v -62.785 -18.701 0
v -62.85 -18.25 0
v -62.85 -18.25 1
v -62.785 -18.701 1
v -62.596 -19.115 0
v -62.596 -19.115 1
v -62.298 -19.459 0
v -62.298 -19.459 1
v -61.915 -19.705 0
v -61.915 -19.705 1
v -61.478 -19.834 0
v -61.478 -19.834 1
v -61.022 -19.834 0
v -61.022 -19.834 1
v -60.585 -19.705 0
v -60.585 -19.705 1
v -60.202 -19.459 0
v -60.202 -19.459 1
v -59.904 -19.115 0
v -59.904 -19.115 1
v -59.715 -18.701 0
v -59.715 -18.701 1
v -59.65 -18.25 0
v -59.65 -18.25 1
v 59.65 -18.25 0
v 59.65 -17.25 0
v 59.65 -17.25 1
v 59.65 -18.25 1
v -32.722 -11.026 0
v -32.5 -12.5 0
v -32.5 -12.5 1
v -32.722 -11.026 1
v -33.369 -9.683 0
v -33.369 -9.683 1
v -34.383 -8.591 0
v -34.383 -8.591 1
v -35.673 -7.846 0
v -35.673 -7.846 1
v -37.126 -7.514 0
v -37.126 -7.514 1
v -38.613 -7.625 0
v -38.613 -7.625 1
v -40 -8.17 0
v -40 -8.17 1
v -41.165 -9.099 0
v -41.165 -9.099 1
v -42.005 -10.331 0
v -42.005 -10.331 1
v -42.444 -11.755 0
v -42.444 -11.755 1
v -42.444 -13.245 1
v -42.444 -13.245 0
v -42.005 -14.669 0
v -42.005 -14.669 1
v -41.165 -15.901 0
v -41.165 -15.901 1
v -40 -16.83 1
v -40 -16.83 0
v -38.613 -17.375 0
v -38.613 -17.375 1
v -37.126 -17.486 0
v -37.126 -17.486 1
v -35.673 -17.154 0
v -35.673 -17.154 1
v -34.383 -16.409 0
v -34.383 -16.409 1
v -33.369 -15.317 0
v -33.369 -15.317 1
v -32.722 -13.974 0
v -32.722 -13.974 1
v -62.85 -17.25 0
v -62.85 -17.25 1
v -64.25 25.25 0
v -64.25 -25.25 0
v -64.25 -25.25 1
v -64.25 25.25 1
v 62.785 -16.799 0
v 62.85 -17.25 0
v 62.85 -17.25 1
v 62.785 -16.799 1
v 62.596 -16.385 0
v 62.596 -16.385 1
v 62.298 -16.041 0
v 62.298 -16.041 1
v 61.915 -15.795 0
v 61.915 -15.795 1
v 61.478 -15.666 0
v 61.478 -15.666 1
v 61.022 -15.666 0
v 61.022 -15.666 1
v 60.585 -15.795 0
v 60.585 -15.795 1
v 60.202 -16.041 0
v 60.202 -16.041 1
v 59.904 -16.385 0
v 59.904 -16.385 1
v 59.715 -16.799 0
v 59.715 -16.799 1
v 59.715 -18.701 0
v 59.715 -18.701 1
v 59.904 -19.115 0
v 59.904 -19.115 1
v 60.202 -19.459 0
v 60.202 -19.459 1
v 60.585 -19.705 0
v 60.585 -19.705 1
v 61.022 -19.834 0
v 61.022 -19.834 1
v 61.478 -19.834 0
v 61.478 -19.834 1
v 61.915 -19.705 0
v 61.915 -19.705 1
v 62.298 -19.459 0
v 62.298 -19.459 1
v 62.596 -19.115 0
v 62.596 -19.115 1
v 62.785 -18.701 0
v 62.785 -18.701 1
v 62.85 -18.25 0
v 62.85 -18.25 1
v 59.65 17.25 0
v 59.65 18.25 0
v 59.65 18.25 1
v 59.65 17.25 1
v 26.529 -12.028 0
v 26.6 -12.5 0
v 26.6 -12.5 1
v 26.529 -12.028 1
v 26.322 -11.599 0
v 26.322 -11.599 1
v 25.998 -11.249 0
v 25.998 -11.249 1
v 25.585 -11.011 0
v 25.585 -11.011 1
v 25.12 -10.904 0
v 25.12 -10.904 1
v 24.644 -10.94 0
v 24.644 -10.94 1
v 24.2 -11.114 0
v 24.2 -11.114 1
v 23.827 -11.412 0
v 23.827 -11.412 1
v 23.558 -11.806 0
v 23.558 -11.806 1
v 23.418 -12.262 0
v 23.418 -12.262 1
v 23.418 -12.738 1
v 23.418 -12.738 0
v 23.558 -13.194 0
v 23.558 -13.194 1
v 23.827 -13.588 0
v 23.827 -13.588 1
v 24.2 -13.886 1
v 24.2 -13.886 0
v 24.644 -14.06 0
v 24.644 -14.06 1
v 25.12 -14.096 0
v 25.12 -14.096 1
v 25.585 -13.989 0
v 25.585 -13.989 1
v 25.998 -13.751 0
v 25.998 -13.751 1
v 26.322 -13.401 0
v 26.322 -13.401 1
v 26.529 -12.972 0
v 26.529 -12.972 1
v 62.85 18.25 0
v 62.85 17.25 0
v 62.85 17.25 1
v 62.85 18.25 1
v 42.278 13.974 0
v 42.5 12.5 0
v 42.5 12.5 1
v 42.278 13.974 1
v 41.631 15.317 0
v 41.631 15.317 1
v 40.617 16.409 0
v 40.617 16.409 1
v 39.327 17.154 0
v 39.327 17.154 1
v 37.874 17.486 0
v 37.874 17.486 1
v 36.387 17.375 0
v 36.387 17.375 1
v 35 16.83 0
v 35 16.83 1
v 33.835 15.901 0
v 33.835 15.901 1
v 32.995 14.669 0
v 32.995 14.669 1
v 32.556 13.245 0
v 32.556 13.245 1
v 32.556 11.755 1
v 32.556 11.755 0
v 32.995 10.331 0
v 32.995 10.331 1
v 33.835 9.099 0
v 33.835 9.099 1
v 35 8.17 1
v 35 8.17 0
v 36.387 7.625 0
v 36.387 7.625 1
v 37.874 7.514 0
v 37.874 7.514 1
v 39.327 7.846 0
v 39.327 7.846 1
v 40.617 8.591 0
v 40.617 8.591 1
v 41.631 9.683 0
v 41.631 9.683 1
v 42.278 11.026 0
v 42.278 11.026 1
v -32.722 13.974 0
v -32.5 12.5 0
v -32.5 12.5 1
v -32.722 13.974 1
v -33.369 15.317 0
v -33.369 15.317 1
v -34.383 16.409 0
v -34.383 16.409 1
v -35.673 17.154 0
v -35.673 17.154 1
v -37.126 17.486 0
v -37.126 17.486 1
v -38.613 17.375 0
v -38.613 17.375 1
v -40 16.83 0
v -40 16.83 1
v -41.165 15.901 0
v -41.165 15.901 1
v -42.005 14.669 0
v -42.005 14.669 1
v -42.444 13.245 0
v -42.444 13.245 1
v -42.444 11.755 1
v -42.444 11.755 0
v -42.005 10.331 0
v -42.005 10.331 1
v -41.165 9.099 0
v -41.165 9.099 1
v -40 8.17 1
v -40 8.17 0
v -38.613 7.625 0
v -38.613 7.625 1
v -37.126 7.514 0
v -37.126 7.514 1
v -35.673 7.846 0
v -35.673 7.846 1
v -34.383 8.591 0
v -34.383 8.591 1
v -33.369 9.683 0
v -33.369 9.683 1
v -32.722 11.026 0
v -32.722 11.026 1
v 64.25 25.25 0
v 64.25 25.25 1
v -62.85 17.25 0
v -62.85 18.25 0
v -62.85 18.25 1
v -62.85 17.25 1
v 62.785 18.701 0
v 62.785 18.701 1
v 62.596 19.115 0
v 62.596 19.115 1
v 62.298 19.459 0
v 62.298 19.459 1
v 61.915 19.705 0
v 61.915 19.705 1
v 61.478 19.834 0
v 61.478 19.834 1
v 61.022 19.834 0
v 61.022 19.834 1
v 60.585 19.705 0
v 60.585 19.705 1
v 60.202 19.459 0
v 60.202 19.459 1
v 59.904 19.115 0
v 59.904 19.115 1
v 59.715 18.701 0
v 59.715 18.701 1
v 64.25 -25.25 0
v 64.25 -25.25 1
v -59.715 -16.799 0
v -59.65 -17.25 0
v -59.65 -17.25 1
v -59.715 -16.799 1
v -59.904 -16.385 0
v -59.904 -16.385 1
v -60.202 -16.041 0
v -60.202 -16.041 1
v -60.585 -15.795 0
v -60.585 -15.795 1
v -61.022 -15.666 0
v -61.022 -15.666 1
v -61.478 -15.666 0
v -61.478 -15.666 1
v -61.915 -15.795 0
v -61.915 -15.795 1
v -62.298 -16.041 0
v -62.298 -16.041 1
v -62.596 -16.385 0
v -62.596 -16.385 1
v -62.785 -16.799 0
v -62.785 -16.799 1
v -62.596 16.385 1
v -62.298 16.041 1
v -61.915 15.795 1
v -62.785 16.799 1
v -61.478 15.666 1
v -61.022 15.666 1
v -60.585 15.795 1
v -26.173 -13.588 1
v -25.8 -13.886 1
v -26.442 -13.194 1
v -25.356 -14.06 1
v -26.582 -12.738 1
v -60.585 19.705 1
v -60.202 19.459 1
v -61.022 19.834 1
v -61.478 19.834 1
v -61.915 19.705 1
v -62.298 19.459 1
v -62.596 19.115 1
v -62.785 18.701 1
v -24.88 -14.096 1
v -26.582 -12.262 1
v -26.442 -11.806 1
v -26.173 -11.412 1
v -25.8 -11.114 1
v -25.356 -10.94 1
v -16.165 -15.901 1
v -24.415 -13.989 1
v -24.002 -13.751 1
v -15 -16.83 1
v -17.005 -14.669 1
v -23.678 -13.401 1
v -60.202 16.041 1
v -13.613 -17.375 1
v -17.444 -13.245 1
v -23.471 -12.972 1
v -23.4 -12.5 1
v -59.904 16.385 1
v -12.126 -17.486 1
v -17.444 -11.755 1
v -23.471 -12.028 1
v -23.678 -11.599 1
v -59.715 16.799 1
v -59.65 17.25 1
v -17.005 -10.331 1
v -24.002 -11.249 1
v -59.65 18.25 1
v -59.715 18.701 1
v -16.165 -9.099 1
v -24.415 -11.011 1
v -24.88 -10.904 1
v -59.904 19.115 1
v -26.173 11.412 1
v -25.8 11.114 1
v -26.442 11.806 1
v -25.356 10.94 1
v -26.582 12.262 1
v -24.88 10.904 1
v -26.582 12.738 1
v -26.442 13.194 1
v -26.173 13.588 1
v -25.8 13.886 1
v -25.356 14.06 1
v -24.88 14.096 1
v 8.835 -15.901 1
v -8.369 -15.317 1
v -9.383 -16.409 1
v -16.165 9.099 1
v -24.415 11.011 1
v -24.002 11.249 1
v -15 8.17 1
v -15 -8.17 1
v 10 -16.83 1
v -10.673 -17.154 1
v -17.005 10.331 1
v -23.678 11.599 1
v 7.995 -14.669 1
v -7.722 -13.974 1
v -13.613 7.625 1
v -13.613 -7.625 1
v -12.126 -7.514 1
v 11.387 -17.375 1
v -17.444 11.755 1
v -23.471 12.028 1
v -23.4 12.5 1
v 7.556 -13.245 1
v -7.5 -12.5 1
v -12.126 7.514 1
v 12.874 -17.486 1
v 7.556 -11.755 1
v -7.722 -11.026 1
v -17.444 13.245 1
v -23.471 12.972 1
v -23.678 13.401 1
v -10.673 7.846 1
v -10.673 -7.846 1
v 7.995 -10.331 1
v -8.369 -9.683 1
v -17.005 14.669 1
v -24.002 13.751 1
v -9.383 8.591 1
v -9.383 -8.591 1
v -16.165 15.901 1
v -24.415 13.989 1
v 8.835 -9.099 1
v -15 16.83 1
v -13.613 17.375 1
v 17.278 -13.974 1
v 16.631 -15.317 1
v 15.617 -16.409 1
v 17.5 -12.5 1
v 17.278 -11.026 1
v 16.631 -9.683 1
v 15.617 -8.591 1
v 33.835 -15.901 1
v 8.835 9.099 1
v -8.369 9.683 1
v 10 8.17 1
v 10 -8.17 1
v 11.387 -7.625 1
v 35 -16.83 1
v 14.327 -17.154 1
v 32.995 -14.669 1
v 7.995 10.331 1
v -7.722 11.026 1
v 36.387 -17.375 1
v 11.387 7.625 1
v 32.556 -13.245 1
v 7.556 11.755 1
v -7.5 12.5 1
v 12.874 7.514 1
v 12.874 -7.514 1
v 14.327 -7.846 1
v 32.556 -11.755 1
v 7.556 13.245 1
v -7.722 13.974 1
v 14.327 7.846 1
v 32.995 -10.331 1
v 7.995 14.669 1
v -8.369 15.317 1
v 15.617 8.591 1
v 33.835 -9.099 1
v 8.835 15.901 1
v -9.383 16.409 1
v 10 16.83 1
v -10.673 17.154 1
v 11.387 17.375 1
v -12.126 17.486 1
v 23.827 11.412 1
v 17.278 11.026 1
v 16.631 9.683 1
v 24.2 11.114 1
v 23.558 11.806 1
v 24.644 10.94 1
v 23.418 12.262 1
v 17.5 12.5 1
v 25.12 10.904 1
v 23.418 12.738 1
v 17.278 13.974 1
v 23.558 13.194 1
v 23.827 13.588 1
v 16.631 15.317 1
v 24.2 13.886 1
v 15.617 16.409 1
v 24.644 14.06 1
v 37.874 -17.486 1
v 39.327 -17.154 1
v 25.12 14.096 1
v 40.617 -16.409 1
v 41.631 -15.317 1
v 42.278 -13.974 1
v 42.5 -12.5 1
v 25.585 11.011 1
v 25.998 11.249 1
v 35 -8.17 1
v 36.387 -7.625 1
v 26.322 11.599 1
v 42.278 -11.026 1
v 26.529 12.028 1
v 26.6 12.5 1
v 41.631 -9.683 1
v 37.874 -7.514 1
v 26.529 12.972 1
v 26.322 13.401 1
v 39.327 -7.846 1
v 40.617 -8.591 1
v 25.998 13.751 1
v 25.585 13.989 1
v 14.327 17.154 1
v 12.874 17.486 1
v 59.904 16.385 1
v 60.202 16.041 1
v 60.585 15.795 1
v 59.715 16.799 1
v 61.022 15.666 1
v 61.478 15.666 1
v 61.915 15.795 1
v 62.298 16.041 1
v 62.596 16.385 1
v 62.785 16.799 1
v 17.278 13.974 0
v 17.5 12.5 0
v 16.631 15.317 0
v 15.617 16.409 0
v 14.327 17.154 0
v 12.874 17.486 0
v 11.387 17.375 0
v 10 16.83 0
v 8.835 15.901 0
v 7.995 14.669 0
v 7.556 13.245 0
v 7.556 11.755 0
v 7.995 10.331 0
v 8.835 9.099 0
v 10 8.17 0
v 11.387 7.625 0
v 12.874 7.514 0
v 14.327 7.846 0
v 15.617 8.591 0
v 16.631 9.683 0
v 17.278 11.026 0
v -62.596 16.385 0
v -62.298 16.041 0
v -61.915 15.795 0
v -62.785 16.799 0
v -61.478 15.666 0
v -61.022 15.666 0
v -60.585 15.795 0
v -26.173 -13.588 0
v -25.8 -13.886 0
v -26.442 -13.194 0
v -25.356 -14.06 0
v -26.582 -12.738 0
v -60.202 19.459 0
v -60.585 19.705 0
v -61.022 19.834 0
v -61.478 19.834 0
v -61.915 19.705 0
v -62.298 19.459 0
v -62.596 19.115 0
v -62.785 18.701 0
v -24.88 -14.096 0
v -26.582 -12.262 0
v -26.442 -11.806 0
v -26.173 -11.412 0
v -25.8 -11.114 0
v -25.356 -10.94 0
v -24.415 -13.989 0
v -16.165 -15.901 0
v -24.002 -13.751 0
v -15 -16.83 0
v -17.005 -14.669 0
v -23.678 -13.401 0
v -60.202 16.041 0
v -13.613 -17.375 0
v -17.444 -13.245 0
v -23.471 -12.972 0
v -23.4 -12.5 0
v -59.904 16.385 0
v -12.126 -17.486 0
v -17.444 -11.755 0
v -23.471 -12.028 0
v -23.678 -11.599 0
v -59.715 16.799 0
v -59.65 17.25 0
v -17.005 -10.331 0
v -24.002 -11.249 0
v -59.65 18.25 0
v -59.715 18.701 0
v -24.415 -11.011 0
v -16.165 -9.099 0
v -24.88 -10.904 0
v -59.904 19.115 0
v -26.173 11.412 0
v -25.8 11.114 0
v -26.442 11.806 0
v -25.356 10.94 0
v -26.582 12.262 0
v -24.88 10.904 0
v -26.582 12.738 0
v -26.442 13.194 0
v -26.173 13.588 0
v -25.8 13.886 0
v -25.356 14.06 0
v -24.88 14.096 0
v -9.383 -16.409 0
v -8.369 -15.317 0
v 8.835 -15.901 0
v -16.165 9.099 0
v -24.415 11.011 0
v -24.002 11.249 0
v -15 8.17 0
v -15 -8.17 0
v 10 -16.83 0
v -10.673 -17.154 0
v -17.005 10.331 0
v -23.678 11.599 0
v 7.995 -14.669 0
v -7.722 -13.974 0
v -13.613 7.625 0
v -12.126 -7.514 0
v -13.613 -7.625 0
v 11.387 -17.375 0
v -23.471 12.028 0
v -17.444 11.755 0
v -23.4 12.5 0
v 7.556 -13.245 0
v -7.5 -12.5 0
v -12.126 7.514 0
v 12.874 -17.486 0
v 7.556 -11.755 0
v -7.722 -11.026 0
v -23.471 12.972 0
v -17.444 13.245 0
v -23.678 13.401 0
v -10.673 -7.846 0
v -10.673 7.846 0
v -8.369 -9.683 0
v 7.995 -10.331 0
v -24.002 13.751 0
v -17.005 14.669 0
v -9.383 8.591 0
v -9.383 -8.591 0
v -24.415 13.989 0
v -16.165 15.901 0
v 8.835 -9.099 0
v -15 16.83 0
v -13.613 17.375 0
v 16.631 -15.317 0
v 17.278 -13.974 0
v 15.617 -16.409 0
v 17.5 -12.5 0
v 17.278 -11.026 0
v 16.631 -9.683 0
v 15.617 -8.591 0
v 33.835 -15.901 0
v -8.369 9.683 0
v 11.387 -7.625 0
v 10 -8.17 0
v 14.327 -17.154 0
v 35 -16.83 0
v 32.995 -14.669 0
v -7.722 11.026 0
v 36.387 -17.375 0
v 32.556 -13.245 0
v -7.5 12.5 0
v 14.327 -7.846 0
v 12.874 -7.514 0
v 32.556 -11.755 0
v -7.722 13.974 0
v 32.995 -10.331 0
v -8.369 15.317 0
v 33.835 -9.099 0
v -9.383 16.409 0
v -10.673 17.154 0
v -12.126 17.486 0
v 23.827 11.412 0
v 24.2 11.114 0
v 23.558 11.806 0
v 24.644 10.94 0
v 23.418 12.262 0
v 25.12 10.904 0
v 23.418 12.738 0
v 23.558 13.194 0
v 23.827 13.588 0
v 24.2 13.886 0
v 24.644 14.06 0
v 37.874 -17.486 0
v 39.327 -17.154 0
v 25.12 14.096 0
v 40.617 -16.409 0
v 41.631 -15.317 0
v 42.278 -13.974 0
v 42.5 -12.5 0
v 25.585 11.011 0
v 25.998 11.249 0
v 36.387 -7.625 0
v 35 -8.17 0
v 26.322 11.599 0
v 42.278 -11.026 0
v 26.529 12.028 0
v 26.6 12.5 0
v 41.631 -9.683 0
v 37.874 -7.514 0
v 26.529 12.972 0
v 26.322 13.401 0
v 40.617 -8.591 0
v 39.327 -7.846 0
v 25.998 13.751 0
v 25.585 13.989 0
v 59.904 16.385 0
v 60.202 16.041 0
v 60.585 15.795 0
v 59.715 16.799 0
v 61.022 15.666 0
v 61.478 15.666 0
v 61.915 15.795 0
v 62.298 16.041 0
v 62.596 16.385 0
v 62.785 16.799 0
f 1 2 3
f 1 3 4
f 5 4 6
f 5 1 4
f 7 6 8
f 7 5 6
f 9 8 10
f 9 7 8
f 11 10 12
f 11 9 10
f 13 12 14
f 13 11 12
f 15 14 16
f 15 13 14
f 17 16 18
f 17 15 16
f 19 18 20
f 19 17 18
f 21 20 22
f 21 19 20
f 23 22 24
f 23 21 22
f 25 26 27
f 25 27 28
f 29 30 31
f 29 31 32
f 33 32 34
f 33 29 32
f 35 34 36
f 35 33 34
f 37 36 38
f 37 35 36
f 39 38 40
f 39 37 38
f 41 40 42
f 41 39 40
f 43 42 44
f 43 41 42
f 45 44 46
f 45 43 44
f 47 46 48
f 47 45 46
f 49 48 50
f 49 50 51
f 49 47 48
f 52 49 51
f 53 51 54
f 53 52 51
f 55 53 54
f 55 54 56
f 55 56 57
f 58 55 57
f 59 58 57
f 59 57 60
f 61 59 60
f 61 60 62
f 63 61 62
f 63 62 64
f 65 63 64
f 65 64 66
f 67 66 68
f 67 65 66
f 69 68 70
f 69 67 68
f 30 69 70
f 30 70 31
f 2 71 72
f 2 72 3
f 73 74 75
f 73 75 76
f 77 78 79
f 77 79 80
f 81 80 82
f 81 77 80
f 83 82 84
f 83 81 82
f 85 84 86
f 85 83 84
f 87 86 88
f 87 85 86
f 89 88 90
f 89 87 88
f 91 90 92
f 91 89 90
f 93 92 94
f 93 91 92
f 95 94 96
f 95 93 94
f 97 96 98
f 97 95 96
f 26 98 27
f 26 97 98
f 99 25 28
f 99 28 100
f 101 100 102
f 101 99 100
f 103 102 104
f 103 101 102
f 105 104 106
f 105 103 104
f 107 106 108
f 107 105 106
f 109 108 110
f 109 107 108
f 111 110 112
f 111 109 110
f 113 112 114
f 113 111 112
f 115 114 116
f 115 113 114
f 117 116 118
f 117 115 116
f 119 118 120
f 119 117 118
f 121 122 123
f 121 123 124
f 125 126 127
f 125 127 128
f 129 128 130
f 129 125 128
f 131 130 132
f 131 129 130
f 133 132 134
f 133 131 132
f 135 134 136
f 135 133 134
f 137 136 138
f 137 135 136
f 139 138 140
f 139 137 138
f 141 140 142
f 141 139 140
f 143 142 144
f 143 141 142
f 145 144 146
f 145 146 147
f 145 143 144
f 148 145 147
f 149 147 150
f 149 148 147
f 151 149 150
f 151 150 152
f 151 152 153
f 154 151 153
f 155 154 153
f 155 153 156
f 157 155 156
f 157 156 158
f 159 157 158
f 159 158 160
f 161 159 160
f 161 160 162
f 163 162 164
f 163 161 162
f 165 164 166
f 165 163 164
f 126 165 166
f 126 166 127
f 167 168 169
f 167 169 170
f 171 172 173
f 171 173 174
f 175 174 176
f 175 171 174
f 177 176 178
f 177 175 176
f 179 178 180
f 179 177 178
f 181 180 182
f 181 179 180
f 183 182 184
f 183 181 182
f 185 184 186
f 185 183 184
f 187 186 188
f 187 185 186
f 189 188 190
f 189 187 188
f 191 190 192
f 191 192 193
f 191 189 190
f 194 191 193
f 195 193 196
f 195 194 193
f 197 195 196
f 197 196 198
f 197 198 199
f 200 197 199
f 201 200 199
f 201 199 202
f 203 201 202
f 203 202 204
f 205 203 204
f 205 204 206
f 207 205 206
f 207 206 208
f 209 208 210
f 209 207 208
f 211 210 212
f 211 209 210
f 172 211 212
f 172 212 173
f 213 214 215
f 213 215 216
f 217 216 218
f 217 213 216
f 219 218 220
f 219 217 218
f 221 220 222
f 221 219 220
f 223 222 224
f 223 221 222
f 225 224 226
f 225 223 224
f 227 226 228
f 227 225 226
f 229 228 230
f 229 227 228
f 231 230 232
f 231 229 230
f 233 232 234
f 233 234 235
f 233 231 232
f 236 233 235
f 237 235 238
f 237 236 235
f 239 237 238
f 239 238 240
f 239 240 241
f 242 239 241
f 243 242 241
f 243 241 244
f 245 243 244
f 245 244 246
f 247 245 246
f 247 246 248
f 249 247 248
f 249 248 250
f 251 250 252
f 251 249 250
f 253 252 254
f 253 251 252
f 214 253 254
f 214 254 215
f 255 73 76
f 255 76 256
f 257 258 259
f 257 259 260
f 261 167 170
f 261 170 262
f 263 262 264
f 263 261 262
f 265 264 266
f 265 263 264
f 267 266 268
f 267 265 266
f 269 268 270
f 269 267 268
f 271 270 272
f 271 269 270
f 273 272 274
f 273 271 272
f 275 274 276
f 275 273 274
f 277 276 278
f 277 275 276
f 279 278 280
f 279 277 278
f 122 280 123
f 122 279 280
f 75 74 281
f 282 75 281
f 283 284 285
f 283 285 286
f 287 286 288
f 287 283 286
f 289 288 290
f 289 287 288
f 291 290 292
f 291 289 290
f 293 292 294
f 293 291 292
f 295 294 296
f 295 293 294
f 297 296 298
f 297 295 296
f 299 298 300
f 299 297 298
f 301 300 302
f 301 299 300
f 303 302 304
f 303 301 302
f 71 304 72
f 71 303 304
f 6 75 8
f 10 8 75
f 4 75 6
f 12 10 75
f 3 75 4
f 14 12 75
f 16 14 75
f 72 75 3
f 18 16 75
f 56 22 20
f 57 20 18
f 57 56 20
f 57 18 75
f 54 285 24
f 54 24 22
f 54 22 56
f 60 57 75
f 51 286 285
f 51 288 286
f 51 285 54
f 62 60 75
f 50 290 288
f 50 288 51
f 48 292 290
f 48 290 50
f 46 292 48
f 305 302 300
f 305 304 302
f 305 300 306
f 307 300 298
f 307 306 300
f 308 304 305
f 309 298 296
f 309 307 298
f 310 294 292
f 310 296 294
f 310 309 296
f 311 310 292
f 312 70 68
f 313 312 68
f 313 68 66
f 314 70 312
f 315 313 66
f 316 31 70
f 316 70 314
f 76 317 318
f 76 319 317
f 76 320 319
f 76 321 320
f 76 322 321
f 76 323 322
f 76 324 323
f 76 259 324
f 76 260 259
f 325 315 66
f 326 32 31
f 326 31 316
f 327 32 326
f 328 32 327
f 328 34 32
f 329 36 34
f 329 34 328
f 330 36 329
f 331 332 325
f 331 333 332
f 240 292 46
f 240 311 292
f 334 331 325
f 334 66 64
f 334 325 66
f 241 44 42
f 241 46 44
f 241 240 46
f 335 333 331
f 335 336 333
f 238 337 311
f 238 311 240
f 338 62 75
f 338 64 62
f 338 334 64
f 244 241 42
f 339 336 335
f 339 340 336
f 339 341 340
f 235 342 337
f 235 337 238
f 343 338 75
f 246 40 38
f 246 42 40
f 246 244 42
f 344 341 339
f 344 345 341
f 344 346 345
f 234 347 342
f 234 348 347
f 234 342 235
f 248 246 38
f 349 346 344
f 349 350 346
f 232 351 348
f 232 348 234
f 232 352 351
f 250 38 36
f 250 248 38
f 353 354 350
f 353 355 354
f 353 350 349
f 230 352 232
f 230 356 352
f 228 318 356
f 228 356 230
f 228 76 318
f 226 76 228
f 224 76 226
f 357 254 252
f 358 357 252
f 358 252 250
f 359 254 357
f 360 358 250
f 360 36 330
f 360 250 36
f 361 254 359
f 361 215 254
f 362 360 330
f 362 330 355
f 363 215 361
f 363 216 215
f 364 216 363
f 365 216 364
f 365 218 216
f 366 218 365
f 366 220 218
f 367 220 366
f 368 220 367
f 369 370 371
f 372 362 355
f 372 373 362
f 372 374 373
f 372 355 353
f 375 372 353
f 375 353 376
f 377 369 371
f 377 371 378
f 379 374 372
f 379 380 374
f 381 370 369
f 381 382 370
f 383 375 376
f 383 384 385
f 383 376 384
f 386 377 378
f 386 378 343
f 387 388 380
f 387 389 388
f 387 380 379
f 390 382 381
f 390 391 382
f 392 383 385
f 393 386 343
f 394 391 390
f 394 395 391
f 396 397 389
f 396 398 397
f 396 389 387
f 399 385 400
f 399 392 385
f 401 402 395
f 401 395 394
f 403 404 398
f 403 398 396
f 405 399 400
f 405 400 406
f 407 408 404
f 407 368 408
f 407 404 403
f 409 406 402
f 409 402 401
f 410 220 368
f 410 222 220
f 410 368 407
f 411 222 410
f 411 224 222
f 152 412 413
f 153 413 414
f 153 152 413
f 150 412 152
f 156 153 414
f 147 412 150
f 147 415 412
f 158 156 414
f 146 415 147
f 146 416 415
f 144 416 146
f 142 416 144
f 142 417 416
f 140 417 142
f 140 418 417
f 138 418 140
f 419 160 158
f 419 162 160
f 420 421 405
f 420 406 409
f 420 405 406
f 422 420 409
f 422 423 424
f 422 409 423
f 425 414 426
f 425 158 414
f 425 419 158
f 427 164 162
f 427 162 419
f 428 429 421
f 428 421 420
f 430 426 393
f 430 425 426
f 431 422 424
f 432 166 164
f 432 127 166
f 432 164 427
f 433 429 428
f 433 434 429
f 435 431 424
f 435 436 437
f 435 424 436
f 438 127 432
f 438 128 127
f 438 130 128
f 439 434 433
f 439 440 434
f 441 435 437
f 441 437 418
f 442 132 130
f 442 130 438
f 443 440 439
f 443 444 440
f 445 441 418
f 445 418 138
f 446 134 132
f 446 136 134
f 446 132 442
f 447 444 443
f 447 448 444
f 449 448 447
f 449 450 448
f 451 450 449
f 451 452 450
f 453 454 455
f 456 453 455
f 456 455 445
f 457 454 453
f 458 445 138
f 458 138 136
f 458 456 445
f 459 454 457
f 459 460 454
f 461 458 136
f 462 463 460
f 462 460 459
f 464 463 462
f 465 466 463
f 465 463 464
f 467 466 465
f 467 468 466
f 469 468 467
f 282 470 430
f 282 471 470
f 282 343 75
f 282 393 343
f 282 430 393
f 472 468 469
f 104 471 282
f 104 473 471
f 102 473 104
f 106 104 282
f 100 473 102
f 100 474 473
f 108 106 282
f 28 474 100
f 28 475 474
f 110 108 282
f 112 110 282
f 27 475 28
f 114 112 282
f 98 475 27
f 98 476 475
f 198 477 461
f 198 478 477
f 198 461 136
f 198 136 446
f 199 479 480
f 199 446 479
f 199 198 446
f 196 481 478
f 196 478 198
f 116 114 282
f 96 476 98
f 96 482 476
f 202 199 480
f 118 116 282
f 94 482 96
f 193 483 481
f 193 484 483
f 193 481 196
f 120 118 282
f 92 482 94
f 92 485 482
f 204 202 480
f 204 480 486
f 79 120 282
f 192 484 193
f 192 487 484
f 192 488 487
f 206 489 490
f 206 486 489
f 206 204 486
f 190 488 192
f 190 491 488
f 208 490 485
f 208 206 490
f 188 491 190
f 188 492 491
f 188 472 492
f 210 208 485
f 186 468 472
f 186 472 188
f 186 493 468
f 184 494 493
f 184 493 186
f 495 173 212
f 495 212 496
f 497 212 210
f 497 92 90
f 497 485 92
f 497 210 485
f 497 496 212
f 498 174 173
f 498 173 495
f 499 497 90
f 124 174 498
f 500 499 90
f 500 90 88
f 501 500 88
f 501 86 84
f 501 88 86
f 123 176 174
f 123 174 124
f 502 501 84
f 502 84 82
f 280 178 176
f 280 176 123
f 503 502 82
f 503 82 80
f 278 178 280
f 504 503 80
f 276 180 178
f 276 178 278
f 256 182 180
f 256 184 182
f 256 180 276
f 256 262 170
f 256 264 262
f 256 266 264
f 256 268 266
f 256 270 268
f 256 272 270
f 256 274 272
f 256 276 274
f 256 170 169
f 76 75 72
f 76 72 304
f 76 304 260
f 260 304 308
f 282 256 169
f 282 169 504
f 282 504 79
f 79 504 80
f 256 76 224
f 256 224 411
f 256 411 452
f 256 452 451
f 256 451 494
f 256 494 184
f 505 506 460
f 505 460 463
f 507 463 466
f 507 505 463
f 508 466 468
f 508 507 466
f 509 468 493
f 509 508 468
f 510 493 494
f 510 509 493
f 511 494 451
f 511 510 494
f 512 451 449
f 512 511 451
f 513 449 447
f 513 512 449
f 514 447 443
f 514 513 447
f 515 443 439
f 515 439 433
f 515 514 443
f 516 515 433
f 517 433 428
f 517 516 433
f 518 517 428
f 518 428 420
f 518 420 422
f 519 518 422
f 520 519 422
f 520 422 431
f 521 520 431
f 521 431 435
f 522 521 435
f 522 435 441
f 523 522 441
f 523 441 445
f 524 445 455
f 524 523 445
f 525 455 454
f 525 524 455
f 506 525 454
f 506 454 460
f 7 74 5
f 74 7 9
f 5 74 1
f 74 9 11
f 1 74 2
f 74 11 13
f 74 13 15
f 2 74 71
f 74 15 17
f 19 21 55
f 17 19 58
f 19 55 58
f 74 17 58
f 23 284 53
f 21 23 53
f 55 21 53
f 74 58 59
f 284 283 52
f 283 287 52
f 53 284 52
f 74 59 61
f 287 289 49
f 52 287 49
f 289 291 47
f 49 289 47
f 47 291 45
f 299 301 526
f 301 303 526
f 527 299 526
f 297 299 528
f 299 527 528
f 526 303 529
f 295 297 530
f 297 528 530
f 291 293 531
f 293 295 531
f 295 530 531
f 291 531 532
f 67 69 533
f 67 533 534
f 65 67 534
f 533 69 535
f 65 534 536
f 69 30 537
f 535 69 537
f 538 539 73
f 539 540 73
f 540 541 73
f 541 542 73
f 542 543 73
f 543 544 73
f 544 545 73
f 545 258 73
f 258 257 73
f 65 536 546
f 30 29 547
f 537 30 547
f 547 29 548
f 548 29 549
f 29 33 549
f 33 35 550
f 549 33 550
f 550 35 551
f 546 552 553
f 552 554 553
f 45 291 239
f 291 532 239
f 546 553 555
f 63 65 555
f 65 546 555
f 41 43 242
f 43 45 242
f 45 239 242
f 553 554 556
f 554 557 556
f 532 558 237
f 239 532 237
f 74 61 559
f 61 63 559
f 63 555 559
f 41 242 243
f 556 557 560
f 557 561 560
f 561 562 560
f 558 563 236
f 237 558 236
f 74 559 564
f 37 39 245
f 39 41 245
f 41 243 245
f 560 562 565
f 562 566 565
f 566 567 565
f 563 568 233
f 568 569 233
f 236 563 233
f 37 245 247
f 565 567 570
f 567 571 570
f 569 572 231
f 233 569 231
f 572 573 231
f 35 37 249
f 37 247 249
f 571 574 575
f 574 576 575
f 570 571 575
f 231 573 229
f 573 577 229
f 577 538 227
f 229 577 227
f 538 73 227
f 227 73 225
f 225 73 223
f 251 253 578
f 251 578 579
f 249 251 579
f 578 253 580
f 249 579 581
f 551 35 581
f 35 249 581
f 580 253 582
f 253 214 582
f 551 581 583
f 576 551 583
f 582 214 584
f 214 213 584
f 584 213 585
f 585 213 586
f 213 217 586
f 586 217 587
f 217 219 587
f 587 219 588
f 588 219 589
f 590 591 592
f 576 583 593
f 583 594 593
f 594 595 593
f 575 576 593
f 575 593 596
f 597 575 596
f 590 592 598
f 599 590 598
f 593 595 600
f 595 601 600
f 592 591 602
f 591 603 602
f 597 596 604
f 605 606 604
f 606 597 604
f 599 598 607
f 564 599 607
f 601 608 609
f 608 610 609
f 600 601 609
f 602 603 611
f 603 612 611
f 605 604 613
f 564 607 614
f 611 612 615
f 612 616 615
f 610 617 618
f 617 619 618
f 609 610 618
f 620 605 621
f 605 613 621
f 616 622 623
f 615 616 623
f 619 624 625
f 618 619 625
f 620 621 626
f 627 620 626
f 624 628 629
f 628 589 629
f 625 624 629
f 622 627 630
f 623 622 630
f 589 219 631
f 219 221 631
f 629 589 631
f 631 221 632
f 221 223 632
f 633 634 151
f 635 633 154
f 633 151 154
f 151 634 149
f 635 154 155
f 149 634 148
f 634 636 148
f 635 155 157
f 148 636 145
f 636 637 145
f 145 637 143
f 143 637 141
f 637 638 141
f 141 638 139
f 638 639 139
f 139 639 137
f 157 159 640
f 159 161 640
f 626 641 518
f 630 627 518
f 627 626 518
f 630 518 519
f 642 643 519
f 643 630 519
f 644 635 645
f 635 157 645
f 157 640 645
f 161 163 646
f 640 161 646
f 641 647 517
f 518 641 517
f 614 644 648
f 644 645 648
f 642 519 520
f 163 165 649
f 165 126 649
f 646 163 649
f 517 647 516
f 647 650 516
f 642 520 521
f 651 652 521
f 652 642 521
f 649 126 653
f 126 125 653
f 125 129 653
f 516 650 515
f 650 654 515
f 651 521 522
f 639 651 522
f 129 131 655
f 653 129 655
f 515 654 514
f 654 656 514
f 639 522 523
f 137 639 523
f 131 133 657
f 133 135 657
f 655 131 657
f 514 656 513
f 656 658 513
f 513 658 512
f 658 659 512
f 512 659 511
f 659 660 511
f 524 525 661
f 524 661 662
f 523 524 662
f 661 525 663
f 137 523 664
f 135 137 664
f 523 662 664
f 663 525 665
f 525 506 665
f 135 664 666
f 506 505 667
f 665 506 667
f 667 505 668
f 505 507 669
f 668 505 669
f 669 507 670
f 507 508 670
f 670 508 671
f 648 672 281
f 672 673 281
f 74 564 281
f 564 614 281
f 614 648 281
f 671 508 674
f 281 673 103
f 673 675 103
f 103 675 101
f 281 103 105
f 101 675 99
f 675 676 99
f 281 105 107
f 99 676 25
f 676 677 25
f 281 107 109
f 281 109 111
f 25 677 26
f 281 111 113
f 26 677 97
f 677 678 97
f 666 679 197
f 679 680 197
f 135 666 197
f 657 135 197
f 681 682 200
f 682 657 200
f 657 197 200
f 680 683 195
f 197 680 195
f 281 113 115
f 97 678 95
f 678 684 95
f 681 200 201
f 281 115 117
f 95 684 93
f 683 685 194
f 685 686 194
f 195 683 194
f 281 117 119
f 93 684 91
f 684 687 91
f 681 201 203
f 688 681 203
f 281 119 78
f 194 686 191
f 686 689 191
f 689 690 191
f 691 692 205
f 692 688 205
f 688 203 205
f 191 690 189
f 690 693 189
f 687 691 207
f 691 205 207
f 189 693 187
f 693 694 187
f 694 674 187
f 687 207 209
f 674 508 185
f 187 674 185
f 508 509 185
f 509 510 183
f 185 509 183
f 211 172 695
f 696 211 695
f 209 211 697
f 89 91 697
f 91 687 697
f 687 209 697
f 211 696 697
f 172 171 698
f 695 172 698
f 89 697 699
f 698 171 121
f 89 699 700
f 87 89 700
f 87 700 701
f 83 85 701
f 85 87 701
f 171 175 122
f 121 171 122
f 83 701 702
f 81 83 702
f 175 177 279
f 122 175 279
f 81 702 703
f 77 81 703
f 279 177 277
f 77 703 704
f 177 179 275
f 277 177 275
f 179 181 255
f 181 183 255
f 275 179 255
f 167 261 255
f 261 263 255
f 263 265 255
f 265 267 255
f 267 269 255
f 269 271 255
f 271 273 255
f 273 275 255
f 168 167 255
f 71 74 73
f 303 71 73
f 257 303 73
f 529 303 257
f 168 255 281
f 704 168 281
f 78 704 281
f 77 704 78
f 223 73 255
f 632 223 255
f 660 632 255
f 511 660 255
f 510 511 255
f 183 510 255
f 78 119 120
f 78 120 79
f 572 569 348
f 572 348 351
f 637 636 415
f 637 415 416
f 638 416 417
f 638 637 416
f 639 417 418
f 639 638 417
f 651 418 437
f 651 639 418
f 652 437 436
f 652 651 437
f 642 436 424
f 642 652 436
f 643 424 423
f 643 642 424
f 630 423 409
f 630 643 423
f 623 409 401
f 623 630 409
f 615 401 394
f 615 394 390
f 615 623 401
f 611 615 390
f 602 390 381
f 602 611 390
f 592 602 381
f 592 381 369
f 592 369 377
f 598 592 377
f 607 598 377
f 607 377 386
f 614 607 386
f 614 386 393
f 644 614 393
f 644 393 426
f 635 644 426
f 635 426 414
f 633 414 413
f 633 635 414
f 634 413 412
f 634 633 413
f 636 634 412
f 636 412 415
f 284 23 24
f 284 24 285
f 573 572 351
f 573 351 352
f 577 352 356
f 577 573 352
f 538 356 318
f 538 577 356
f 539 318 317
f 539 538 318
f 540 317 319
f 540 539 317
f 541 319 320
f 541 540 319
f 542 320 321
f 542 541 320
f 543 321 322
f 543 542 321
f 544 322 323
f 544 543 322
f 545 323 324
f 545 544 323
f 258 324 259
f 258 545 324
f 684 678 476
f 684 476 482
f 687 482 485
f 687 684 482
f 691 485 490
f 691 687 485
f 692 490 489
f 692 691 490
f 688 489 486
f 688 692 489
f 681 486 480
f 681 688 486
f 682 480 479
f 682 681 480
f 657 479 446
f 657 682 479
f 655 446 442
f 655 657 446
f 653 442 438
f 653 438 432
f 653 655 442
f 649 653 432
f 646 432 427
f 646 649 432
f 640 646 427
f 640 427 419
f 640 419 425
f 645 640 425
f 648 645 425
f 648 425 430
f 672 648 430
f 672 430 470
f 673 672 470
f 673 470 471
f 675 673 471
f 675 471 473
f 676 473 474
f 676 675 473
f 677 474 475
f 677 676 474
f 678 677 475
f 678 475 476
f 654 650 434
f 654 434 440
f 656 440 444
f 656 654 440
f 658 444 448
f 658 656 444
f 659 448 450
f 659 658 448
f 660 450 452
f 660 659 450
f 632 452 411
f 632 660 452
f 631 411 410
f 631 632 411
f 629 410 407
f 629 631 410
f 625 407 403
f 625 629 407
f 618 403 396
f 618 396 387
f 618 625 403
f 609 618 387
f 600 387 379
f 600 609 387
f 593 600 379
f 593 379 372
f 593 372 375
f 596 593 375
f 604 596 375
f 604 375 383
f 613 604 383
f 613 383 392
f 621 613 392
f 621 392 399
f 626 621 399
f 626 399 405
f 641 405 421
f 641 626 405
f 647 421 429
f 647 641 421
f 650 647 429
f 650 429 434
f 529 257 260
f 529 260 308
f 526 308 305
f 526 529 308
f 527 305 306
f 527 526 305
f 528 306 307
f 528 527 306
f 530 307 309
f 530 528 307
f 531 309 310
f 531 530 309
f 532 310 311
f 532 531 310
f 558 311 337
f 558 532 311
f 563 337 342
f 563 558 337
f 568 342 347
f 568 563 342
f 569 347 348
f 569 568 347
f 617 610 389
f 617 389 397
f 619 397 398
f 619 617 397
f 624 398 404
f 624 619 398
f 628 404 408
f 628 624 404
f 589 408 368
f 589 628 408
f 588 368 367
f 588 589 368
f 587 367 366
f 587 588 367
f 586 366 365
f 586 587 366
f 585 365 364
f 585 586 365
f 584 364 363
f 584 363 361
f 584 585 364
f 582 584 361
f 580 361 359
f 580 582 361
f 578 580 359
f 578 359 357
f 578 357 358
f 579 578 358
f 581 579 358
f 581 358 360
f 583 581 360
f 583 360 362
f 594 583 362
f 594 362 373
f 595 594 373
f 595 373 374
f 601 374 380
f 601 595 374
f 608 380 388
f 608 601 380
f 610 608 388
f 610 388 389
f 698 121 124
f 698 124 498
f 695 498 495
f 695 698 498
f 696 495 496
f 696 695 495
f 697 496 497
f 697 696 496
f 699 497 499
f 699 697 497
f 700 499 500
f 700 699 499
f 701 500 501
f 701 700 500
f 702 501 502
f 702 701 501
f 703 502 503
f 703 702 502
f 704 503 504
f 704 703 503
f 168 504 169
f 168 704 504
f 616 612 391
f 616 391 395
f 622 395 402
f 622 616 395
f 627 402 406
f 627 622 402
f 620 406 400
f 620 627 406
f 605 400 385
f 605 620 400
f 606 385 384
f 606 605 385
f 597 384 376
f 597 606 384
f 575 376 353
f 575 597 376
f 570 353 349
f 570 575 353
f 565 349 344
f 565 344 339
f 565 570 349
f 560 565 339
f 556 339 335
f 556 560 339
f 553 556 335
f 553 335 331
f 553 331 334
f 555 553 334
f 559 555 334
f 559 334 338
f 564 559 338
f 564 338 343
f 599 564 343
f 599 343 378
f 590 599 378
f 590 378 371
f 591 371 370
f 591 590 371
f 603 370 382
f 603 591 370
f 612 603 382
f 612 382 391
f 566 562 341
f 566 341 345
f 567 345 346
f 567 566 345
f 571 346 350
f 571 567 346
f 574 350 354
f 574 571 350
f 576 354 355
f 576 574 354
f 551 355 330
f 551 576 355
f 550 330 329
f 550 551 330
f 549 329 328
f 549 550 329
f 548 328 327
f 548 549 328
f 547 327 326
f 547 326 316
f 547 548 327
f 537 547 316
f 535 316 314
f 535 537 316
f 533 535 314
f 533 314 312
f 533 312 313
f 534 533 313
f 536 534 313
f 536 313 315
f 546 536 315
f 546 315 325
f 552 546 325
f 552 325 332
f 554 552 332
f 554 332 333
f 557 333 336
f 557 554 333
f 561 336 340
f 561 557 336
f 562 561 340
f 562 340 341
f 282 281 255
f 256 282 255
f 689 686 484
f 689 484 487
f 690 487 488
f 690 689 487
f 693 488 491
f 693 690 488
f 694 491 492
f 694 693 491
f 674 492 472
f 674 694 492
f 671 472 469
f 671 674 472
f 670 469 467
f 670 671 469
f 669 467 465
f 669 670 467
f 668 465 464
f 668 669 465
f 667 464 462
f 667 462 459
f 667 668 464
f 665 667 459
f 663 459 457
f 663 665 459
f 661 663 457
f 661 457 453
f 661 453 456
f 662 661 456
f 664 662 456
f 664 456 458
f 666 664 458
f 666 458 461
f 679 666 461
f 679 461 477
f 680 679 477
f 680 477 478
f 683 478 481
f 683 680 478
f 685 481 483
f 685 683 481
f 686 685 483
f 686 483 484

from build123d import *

# Parameters (mm, degrees)
ESQUISSE1_W        = 128.5
ESQUISSE1_H        = 50.5
ESQUISSE1_R        = 1.6
ESQUISSE1_R_2      = 5
BOSS_EXTRU_1_DEPTH = 1


with BuildPart() as part:
    # Esquisse1 → Boss.-Extru.1 (new body)
    with BuildSketch(Plane.XY):
        Rectangle(ESQUISSE1_W, ESQUISSE1_H)
        with Locations((25, 12.5)):
            Circle(ESQUISSE1_R, mode=Mode.SUBTRACT)
        with Locations((-25, 12.5)):
            Circle(ESQUISSE1_R, mode=Mode.SUBTRACT)
        with Locations((-25, -12.5)):
            Circle(ESQUISSE1_R, mode=Mode.SUBTRACT)
        with Locations((25, -12.5)):
            Circle(ESQUISSE1_R, mode=Mode.SUBTRACT)
        with Locations((12.5, -12.5)):
            Circle(ESQUISSE1_R_2, mode=Mode.SUBTRACT)
        with Locations((-37.5, -12.5)):
            Circle(ESQUISSE1_R_2, mode=Mode.SUBTRACT)
        with Locations((-12.5, -12.5)):
            Circle(ESQUISSE1_R_2, mode=Mode.SUBTRACT)
        with Locations((37.5, -12.5)):
            Circle(ESQUISSE1_R_2, mode=Mode.SUBTRACT)
        with Locations((37.5, 12.5)):
            Circle(ESQUISSE1_R_2, mode=Mode.SUBTRACT)
        with Locations((12.5, 12.5)):
            Circle(ESQUISSE1_R_2, mode=Mode.SUBTRACT)
        with Locations((-12.5, 12.5)):
            Circle(ESQUISSE1_R_2, mode=Mode.SUBTRACT)
        with Locations((-37.5, 12.5)):
            Circle(ESQUISSE1_R_2, mode=Mode.SUBTRACT)
        with BuildLine():
            ThreePointArc((62.85, -17.25), (61.25, -15.65), (59.65, -17.25))
            Line((59.65, -17.25), (59.65, -18.25))
            ThreePointArc((59.65, -18.25), (61.25, -19.85), (62.85, -18.25))
            Line((62.85, -18.25), (62.85, -17.25))
        make_face(mode=Mode.SUBTRACT)
        with BuildLine():
            ThreePointArc((59.65, 17.25), (61.25, 15.65), (62.85, 17.25))
            Line((62.85, 17.25), (62.85, 18.25))
            ThreePointArc((62.85, 18.25), (61.25, 19.85), (59.65, 18.25))
            Line((59.65, 18.25), (59.65, 17.25))
        make_face(mode=Mode.SUBTRACT)
        with BuildLine():
            ThreePointArc((-59.65, -17.25), (-61.25, -15.65), (-62.85, -17.25))
            Line((-62.85, -17.25), (-62.85, -18.25))
            ThreePointArc((-62.85, -18.25), (-61.25, -19.85), (-59.65, -18.25))
            Line((-59.65, -18.25), (-59.65, -17.25))
        make_face(mode=Mode.SUBTRACT)
        with BuildLine():
            ThreePointArc((-59.65, 18.25), (-61.25, 19.85), (-62.85, 18.25))
            Line((-62.85, 18.25), (-62.85, 17.25))
            ThreePointArc((-62.85, 17.25), (-61.25, 15.65), (-59.65, 17.25))
            Line((-59.65, 17.25), (-59.65, 18.25))
        make_face(mode=Mode.SUBTRACT)
    extrude(amount=BOSS_EXTRU_1_DEPTH)


solid = part.part
